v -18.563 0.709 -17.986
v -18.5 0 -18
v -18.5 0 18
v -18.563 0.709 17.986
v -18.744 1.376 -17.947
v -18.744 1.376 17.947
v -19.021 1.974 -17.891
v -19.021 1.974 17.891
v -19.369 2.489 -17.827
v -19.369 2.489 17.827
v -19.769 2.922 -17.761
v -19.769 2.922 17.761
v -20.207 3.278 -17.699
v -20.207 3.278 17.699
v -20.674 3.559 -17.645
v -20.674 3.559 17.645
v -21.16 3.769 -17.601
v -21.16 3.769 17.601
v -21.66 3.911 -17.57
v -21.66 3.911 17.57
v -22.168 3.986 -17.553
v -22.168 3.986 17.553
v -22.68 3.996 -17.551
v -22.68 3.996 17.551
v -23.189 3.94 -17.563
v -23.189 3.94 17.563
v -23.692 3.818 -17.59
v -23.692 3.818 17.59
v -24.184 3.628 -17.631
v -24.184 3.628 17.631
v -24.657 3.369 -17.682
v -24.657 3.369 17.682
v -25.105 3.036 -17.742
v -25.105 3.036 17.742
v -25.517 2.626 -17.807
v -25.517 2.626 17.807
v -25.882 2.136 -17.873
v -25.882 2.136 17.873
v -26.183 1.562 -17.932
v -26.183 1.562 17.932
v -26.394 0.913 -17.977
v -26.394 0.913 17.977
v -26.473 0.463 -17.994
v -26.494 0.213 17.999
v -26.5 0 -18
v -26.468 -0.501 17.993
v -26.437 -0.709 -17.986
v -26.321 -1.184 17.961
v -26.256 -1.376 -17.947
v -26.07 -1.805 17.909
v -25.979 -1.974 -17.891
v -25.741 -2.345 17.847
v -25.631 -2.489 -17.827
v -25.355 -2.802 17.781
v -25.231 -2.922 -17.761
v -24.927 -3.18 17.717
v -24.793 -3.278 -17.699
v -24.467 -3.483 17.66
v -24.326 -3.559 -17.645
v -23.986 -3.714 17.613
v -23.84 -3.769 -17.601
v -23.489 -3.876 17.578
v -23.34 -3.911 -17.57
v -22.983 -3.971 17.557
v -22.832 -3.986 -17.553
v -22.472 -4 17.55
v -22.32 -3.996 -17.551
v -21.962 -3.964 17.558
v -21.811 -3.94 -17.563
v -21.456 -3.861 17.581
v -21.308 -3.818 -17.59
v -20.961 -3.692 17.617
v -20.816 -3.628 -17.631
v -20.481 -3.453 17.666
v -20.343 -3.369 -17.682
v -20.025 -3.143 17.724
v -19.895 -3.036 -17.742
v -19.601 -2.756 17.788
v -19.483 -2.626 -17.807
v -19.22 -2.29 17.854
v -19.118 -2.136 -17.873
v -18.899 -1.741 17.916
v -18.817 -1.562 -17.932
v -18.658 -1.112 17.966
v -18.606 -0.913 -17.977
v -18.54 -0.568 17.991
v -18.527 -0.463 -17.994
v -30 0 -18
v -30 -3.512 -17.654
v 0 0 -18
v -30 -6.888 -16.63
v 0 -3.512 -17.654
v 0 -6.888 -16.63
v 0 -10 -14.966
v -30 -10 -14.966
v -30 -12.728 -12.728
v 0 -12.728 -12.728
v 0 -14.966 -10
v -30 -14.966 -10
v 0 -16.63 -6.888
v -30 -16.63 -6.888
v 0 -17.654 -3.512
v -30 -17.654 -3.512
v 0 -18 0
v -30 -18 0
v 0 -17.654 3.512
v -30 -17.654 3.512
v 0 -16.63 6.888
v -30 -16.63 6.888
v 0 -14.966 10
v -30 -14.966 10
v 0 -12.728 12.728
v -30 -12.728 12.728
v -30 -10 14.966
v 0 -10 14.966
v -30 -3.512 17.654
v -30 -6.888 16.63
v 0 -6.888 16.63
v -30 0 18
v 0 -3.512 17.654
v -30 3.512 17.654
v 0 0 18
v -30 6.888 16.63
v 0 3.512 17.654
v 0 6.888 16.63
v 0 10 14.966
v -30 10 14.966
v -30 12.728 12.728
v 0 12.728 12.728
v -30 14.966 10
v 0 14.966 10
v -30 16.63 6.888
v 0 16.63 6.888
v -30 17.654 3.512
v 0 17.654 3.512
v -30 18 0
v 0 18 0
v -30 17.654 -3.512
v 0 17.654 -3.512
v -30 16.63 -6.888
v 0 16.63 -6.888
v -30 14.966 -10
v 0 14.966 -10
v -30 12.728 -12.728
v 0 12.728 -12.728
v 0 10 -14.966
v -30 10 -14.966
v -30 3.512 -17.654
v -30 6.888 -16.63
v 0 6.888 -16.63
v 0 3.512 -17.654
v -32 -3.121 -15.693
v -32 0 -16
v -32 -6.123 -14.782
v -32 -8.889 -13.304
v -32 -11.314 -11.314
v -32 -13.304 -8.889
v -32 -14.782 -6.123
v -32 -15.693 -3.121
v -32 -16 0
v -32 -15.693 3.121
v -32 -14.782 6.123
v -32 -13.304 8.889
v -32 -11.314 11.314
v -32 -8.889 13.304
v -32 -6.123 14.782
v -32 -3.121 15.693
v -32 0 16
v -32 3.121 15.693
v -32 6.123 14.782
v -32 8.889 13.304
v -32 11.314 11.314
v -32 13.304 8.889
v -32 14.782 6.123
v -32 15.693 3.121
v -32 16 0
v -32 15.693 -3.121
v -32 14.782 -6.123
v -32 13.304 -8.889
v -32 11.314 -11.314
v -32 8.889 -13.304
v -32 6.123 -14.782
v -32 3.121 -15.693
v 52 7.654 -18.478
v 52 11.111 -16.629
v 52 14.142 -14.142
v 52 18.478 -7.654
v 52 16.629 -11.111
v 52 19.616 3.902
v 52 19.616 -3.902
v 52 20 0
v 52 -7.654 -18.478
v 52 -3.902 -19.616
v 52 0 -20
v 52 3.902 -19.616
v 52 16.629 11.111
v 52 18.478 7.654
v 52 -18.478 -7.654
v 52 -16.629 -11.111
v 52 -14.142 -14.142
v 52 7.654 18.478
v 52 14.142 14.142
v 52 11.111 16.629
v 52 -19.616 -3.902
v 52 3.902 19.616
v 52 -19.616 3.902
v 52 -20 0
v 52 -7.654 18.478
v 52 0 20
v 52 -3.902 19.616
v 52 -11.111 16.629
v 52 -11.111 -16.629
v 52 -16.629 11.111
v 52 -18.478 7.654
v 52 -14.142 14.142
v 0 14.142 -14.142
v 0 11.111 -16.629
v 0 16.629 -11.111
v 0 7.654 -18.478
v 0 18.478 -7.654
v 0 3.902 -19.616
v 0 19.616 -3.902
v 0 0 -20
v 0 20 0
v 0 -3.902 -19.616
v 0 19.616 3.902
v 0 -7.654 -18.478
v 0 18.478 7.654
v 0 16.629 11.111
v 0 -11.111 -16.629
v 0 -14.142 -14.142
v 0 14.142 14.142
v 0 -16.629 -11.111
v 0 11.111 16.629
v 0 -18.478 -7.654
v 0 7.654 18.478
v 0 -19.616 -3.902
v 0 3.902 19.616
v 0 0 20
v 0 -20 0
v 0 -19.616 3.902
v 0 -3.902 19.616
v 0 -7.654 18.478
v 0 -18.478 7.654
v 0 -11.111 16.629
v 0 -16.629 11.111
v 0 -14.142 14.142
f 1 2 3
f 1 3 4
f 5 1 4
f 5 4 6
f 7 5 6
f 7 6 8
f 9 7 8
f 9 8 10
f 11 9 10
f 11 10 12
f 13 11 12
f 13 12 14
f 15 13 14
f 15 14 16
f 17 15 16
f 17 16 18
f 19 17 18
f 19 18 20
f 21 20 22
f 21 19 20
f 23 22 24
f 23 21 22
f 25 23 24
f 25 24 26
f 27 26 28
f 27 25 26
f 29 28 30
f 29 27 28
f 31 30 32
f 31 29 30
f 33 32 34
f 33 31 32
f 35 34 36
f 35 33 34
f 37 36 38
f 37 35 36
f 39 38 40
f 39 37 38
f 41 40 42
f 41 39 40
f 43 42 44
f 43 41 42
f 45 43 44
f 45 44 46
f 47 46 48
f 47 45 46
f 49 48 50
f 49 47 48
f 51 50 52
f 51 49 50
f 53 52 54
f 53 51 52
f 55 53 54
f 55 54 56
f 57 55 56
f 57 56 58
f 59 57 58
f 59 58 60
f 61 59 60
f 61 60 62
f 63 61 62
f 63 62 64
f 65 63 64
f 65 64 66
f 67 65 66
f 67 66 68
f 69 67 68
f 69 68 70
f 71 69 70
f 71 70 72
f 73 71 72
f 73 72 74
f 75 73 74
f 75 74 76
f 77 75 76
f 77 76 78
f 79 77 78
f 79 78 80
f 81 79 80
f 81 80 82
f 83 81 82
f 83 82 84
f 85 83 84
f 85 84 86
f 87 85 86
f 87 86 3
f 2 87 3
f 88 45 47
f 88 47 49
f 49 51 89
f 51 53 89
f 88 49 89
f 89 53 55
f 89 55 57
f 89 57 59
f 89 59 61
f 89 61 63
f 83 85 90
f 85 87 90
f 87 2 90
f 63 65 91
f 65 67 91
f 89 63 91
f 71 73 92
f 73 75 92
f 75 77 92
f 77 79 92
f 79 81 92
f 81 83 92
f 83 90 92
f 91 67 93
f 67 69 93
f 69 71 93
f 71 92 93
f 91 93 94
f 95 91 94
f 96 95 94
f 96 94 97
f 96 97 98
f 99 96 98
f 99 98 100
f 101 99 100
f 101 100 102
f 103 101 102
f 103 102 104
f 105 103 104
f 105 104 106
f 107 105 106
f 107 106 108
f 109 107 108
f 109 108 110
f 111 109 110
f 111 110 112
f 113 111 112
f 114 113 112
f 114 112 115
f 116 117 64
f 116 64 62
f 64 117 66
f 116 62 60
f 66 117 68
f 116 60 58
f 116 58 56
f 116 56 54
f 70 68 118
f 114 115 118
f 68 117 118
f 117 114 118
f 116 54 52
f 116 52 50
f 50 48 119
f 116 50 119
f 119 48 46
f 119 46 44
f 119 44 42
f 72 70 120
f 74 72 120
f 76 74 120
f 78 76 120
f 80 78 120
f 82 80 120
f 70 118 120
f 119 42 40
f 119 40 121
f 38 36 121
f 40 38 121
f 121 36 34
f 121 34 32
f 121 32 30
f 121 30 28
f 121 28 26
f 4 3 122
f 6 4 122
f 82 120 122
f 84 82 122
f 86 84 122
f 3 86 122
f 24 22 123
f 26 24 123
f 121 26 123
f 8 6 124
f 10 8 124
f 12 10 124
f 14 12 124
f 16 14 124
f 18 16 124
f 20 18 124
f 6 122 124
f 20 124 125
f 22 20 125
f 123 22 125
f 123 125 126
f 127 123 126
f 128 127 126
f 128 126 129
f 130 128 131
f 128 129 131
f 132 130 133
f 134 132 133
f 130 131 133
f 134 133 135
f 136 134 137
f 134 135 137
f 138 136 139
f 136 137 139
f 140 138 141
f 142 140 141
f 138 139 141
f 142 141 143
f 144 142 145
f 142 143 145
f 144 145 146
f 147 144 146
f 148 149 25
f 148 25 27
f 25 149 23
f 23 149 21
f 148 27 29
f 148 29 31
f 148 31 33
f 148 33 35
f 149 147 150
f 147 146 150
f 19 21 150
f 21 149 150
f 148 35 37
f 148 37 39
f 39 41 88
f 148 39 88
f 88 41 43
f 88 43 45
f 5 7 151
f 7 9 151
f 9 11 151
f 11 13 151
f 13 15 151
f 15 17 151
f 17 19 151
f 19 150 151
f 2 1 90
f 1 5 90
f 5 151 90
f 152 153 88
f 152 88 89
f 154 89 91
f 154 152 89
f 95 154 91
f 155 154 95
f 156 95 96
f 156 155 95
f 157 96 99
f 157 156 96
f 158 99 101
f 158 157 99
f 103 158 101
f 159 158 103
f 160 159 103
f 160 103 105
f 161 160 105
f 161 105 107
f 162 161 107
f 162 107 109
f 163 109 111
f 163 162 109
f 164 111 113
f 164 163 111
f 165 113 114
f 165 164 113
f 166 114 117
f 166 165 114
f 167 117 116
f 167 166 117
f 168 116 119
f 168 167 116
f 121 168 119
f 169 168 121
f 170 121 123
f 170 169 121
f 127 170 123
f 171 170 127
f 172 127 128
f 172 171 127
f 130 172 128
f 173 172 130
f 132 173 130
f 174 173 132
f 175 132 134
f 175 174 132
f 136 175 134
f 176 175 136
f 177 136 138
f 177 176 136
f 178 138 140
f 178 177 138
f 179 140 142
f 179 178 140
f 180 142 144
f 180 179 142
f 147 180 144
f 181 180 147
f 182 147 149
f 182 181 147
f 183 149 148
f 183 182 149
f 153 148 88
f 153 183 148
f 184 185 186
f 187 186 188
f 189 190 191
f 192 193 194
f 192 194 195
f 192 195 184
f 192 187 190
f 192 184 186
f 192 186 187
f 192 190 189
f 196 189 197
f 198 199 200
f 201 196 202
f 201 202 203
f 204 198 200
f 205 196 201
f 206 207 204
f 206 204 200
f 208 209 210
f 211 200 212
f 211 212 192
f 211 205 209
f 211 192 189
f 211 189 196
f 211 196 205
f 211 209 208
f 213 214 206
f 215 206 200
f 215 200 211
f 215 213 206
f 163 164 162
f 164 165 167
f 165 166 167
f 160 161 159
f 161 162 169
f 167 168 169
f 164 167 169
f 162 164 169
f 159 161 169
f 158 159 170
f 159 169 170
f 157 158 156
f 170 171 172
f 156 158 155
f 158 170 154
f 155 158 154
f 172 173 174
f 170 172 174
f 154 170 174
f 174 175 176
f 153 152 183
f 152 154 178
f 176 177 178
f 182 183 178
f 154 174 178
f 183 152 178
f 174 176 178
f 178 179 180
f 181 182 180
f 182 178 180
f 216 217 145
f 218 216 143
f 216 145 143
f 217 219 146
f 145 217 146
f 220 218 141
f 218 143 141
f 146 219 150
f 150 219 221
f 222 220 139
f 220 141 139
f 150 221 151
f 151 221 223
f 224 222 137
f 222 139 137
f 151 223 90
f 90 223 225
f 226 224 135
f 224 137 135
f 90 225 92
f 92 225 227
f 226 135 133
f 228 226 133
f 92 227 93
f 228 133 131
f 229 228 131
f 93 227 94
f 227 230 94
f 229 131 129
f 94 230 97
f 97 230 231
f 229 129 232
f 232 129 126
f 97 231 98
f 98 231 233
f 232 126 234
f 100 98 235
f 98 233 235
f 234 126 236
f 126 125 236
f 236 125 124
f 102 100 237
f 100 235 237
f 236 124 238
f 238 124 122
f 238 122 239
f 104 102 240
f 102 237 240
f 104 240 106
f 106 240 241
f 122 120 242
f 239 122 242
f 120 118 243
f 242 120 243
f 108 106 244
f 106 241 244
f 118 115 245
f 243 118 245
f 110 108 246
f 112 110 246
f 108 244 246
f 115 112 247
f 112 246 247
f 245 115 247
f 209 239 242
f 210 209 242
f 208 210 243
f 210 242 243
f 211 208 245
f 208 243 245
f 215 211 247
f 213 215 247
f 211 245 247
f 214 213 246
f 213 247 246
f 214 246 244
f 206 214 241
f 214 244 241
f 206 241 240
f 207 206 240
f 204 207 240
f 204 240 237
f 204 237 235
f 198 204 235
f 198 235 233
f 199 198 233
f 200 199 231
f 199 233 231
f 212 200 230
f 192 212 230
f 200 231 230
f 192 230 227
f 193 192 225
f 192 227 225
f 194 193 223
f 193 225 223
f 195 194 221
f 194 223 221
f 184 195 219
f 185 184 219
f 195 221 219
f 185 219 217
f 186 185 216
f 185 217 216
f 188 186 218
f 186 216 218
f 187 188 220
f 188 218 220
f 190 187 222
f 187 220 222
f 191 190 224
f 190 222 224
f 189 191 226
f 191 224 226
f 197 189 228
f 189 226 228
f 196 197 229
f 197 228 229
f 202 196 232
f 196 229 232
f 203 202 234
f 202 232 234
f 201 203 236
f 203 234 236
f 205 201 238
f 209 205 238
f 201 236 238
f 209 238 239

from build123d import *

# Parameters (mm, degrees)
SCHIZZO1_R             = 20
ESTRUSIONE1_DEPTH      = 52
SCHIZZO2_R             = 18
ESTRUSIONE2_DEPTH      = 32
ESTRUSIONE5_DEPTH      = 60.194594348
ESTRUSIONE5_DEPTH_BACK = 60.194594348
SCHIZZO5_R             = 4
SMUSSO2_SIZE           = 2
SCHIZZO3_R             = 17
ESTRUSIONE3_DEPTH      = 2
SCHIZZO4_R             = 18
ESTRUSIONE4_DEPTH      = 4
SMUSSO1_SIZE           = 2
SCHIZZO6_R             = 24.071831276
ESTRUSIONE6_DEPTH      = 10


with BuildPart() as part:
    # Schizzo1 → Estrusione1 (new body)
    with BuildSketch(Plane(origin=(0, 0, 0), x_dir=(0, 0, -1), z_dir=(1, 0, 0))):
        with Locations(Location((0, 0, 0), (0, 0, 180))):
            Circle(SCHIZZO1_R)
    extrude(amount=ESTRUSIONE1_DEPTH)

    # Schizzo2 → Estrusione2 (add)
    with BuildSketch(Plane.ZY):
        with Locations(Location((0, 0, 0), (0, 0, 180))):
            Circle(SCHIZZO2_R)
    extrude(amount=ESTRUSIONE2_DEPTH)

    # Schizzo5 → Estrusione5 (cut, two sides: drawn at the far end of the back side and taken through both)
    with BuildSketch(Plane.XY.offset(-ESTRUSIONE5_DEPTH_BACK)):
        with Locations((-22.5, 0)):
            Circle(SCHIZZO5_R)
    extrude(amount=ESTRUSIONE5_DEPTH + ESTRUSIONE5_DEPTH_BACK, mode=Mode.SUBTRACT)

    # Smusso2
    smusso2_edges = [part.edges().sort_by_distance(p)[0] for p in [
        (-32, 0, 18),
    ]]
    chamfer(smusso2_edges, length=SMUSSO2_SIZE)

    # Schizzo3 → Estrusione3 (add)
    with BuildSketch(Plane.ZY.offset(32)):
        Circle(SCHIZZO3_R)
    extrude(amount=ESTRUSIONE3_DEPTH)

    # Schizzo4 → Estrusione4 (add)
    with BuildSketch(Plane.ZY.offset(34)):
        with Locations(Location((0, 0, 0), (0, 0, 180))):
            Circle(SCHIZZO4_R)
    extrude(amount=ESTRUSIONE4_DEPTH)

    # Smusso1
    smusso1_edges = [part.edges().sort_by_distance(p)[0] for p in [
        (-38, 0, 18),
    ]]
    chamfer(smusso1_edges, length=SMUSSO1_SIZE)

    # Schizzo6 → Estrusione6 (cut)
    with BuildSketch(Plane(origin=(-32, 0, 0), x_dir=(0, 0, -1), z_dir=(1, 0, 0))):
        Circle(SCHIZZO6_R)
    extrude(amount=-ESTRUSIONE6_DEPTH, mode=Mode.SUBTRACT)


solid = part.part
